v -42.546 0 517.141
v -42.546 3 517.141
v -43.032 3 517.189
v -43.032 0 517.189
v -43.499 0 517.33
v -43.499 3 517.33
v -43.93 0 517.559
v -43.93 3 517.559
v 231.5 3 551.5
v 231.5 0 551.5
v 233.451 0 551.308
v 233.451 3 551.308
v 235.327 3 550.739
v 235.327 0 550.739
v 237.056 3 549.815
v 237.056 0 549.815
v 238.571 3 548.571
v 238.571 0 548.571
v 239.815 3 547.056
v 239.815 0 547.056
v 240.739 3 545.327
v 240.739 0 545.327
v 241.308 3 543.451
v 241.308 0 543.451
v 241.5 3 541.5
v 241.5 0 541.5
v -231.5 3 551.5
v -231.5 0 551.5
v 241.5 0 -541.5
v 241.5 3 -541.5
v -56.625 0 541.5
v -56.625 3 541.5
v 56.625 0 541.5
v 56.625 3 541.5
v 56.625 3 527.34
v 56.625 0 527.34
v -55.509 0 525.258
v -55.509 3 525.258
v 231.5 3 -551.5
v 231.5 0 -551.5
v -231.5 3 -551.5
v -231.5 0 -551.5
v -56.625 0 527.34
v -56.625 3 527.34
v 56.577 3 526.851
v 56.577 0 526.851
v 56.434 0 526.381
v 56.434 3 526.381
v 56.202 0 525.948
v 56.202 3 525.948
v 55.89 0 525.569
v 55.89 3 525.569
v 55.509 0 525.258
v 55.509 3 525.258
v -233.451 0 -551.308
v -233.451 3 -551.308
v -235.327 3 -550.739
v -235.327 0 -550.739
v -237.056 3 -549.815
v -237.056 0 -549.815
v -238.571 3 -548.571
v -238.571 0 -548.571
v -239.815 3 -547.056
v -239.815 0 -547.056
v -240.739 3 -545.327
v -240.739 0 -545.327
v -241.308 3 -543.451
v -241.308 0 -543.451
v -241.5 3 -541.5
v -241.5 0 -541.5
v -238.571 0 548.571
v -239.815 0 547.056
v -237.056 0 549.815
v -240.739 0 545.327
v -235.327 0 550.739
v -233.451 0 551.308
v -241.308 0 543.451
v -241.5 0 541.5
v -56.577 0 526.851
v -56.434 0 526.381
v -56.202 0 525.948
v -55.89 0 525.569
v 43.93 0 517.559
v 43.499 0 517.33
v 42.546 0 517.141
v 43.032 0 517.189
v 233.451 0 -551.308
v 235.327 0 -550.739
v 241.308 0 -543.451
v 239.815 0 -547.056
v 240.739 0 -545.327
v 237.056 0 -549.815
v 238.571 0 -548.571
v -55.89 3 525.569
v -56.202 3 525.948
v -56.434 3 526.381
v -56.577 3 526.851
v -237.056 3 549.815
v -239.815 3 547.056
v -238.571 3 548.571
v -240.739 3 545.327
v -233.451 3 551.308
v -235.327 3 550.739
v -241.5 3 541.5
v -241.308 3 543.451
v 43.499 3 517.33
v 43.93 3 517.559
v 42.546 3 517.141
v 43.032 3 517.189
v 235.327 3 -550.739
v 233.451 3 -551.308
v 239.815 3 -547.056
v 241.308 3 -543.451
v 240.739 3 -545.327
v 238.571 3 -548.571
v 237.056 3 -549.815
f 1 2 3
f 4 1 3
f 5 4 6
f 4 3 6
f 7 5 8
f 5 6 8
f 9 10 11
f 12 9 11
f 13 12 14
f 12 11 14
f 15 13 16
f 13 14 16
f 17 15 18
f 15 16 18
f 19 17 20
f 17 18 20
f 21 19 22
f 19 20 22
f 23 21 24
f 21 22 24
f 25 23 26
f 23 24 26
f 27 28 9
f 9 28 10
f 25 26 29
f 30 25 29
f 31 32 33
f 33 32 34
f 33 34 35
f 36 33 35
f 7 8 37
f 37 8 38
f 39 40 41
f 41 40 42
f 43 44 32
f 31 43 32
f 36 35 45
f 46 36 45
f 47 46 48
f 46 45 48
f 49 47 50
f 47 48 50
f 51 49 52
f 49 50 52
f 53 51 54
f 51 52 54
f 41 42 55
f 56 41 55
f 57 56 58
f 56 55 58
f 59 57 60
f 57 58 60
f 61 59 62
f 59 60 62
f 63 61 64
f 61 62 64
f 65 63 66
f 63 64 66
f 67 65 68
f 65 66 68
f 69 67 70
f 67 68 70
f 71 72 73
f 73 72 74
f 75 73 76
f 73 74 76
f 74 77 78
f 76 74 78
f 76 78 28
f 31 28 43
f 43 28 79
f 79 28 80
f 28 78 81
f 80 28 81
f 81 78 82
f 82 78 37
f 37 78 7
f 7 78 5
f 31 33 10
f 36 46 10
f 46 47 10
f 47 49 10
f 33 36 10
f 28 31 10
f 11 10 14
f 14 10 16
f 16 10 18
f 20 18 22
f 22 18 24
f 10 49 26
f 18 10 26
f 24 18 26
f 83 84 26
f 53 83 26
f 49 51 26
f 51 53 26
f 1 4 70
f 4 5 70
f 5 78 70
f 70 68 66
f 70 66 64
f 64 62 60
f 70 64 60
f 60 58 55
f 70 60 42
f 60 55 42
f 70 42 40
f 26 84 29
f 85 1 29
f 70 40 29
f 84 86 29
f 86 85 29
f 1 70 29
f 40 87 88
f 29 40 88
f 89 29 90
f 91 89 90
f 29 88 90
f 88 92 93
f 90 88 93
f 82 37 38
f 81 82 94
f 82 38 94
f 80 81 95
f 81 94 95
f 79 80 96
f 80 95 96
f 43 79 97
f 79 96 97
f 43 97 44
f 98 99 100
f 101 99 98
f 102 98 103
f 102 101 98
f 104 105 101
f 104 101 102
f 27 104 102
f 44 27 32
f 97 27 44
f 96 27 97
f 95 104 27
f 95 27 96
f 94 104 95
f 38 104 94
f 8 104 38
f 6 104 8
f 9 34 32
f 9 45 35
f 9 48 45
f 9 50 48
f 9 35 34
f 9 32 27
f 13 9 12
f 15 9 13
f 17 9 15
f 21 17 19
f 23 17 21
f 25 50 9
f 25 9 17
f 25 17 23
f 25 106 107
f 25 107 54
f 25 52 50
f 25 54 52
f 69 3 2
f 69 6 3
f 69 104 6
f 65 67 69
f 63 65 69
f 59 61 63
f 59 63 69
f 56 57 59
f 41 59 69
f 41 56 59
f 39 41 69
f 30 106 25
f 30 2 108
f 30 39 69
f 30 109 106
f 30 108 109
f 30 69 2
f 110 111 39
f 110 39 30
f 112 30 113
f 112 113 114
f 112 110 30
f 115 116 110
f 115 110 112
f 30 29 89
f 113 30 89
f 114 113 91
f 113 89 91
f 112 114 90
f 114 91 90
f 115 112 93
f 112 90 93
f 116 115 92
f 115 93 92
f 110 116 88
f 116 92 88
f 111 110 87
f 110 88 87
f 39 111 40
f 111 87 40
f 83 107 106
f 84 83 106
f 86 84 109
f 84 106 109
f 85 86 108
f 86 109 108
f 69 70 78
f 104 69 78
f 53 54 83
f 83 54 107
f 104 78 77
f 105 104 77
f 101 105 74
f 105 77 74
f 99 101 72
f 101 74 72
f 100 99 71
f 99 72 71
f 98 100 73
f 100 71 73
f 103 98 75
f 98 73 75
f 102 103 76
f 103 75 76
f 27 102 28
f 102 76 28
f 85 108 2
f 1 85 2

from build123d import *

# Parameters (mm, degrees)
BOSS_EXTRUDE1_DEPTH = 3
CUT_EXTRUDE1_DEPTH  = 603.06602628


with BuildPart() as part:
    # Sketch1 → Boss-Extrude1 (new body)
    with BuildSketch(Plane(origin=(0, 0, 0), x_dir=(1, 0, 0), z_dir=(0, 1, 0))):
        with BuildLine():
            Line((-231.5, -551.5), (231.5, -551.5))
            ThreePointArc((231.5, -551.5), (238.571067812, -548.571067812), (241.5, -541.5))
            Line((241.5, -541.5), (241.5, 541.5))
            ThreePointArc((241.5, 541.5), (238.571067812, 548.571067812), (231.5, 551.5))
            Line((231.5, 551.5), (-231.5, 551.5))
            ThreePointArc((-231.5, 551.5), (-238.571067812, 548.571067812), (-241.5, 541.5))
            Line((-241.5, 541.5), (-241.5, -541.5))
            ThreePointArc((-241.5, -541.5), (-238.571067812, -548.571067812), (-231.5, -551.5))
        make_face()
    extrude(amount=BOSS_EXTRUDE1_DEPTH)

    # Sketch2 → Cut-Extrude1 (cut, through all)
    with BuildSketch(Plane(origin=(0, 3, 0), x_dir=(1, 0, 0), z_dir=(0, 1, 0))):
        with BuildLine():
            Line((-56.625, -541.5), (56.625, -541.5))
            Line((56.625, -541.5), (56.625, -527.339918356))
            ThreePointArc((56.625, -527.339918356), (56.328467778, -526.158931587), (55.5092162, -525.258105322))
            Line((55.5092162, -525.258105322), (43.930335234, -517.559203283))
            ThreePointArc((43.930335234, -517.559203283), (43.269122289, -517.247845556), (42.546119034, -517.141016318))
            Line((42.546119034, -517.141016318), (-42.546119034, -517.141016318))
            ThreePointArc((-42.546119034, -517.141016318), (-43.269122289, -517.247845556), (-43.930335234, -517.559203283))
            Line((-43.930335234, -517.559203283), (-55.5092162, -525.258105322))
            ThreePointArc((-55.5092162, -525.258105322), (-56.328467778, -526.158931587), (-56.625, -527.339918356))
            Line((-56.625, -527.339918356), (-56.625, -541.5))
        make_face()
    extrude(amount=-CUT_EXTRUDE1_DEPTH, mode=Mode.SUBTRACT)


solid = part.part
